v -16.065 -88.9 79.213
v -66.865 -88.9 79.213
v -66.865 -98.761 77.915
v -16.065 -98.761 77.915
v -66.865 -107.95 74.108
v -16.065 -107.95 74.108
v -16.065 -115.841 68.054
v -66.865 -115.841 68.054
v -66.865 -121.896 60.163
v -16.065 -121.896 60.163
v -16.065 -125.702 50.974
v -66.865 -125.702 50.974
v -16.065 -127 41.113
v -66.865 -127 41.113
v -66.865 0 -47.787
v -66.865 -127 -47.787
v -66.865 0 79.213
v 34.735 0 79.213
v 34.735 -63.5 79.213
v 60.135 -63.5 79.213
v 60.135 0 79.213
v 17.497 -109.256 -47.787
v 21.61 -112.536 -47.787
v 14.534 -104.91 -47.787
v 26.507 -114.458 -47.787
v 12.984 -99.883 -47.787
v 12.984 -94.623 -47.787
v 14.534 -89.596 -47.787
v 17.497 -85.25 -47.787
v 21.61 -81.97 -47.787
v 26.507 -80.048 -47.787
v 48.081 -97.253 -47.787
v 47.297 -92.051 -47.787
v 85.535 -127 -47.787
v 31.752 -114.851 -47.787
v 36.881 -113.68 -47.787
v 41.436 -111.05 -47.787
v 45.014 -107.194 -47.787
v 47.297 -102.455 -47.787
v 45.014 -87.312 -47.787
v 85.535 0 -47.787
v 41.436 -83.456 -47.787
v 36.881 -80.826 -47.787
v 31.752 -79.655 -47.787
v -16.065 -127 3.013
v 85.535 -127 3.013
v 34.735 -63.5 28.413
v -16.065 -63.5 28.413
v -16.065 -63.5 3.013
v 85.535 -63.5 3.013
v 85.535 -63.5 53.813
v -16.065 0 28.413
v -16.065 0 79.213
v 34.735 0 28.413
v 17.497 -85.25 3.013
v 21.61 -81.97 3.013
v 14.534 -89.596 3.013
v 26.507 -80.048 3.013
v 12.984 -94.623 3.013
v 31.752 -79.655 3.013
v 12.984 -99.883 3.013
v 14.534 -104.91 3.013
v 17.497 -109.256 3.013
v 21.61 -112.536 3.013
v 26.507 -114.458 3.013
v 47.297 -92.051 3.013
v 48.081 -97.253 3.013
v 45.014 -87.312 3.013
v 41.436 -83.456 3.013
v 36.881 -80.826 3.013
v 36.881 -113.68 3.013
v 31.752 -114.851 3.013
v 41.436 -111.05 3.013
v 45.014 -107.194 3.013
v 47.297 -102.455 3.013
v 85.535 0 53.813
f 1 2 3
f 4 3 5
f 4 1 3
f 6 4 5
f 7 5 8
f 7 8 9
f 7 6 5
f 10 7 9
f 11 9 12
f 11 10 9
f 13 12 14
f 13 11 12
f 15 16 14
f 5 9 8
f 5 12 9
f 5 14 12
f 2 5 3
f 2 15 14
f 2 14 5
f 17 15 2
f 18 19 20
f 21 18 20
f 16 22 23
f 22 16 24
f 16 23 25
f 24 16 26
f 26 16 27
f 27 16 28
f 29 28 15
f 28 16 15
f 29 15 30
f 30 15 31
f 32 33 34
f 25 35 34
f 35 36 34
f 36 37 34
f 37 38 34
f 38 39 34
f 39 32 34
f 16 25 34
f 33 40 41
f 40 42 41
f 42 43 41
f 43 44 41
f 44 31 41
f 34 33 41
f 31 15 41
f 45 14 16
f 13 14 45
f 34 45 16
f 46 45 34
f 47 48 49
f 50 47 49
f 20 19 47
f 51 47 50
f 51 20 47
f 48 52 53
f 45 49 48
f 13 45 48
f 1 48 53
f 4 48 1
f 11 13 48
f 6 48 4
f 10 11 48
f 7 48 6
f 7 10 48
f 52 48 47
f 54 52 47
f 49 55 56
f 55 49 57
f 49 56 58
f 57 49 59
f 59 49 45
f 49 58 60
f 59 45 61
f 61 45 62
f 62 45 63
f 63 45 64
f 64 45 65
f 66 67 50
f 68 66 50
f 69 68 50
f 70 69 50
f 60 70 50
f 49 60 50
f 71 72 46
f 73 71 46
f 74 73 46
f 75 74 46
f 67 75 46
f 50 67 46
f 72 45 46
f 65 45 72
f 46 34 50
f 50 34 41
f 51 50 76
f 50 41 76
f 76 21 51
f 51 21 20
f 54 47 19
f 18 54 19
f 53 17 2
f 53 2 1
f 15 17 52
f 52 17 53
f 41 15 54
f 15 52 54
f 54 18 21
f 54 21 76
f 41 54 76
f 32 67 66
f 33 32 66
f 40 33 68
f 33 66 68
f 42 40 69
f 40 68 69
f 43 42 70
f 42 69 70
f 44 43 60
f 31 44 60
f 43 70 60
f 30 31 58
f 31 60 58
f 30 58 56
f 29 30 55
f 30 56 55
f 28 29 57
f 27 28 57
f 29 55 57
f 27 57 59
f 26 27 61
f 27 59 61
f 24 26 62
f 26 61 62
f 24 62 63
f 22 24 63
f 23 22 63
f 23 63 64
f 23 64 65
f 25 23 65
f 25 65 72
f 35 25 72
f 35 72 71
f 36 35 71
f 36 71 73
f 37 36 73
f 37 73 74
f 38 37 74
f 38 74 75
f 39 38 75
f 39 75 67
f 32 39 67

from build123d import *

# Parameters (mm, degrees)
F0_W      = 152.4
F0_H      = 127
F1_DEPTH  = 127
F2_W      = 101.6
F2_H      = 76.2
F3_DEPTH  = 88.9
F4_R      = 38.1
F5_DEPTH  = 25.4
F6_W      = 50.8
F6_H      = 50.8
F7_DEPTH  = 63.501
F8_SIZE   = 25.4
F9_R      = 17.6472220147
F10_DEPTH = 50.801


with BuildPart() as f1:
    # F0 (on Front) → F1 (new body)
    with BuildSketch(Plane.XZ):
        with Locations((9.334500879, 15.7128399368)):
            Rectangle(F0_W, F0_H)
    extrude(amount=F1_DEPTH)

    # F2 (on face) → F3 (cut)
    with BuildSketch(Plane.XZ.offset(127)):
        with Locations((34.734500879, 41.1128399368)):
            Rectangle(F2_W, F2_H)
    extrude(amount=-F3_DEPTH, mode=Mode.SUBTRACT)

    # F4
    f4_edges = [f1.edges().sort_by_distance(p)[0] for p in [
        (-41.465499, -127, 79.21284),
    ]]
    fillet(f4_edges, radius=F4_R)

    # F5 (add): a face of the model
    f5_faces = [f1.faces().sort_by_distance(p)[0] for p in [
        (34.734500879, -38.1, 41.1128399368),
    ]]
    extrude(f5_faces, amount=F5_DEPTH)

    # F6 (on face) → F7 (cut, through all)
    with BuildSketch(Plane.XZ.offset(63.5)):
        with Locations((9.334500879, 53.8128399368)):
            Rectangle(F6_W, F6_H)
    extrude(amount=-F7_DEPTH, mode=Mode.SUBTRACT)

    # F8
    f8_edges = [f1.edges().sort_by_distance(p)[0] for p in [
        (85.534501, -31.75, 79.21284),
    ]]
    chamfer(f8_edges, length=F8_SIZE)

    # F9 (on face) → F10 (cut, through all)
    with BuildSketch(Plane.XY.offset(3.0128399368)):
        with Locations((30.4336287081, -97.2528904676)):
            Circle(F9_R)
    extrude(amount=-F10_DEPTH, mode=Mode.SUBTRACT)


solid = f1.part
